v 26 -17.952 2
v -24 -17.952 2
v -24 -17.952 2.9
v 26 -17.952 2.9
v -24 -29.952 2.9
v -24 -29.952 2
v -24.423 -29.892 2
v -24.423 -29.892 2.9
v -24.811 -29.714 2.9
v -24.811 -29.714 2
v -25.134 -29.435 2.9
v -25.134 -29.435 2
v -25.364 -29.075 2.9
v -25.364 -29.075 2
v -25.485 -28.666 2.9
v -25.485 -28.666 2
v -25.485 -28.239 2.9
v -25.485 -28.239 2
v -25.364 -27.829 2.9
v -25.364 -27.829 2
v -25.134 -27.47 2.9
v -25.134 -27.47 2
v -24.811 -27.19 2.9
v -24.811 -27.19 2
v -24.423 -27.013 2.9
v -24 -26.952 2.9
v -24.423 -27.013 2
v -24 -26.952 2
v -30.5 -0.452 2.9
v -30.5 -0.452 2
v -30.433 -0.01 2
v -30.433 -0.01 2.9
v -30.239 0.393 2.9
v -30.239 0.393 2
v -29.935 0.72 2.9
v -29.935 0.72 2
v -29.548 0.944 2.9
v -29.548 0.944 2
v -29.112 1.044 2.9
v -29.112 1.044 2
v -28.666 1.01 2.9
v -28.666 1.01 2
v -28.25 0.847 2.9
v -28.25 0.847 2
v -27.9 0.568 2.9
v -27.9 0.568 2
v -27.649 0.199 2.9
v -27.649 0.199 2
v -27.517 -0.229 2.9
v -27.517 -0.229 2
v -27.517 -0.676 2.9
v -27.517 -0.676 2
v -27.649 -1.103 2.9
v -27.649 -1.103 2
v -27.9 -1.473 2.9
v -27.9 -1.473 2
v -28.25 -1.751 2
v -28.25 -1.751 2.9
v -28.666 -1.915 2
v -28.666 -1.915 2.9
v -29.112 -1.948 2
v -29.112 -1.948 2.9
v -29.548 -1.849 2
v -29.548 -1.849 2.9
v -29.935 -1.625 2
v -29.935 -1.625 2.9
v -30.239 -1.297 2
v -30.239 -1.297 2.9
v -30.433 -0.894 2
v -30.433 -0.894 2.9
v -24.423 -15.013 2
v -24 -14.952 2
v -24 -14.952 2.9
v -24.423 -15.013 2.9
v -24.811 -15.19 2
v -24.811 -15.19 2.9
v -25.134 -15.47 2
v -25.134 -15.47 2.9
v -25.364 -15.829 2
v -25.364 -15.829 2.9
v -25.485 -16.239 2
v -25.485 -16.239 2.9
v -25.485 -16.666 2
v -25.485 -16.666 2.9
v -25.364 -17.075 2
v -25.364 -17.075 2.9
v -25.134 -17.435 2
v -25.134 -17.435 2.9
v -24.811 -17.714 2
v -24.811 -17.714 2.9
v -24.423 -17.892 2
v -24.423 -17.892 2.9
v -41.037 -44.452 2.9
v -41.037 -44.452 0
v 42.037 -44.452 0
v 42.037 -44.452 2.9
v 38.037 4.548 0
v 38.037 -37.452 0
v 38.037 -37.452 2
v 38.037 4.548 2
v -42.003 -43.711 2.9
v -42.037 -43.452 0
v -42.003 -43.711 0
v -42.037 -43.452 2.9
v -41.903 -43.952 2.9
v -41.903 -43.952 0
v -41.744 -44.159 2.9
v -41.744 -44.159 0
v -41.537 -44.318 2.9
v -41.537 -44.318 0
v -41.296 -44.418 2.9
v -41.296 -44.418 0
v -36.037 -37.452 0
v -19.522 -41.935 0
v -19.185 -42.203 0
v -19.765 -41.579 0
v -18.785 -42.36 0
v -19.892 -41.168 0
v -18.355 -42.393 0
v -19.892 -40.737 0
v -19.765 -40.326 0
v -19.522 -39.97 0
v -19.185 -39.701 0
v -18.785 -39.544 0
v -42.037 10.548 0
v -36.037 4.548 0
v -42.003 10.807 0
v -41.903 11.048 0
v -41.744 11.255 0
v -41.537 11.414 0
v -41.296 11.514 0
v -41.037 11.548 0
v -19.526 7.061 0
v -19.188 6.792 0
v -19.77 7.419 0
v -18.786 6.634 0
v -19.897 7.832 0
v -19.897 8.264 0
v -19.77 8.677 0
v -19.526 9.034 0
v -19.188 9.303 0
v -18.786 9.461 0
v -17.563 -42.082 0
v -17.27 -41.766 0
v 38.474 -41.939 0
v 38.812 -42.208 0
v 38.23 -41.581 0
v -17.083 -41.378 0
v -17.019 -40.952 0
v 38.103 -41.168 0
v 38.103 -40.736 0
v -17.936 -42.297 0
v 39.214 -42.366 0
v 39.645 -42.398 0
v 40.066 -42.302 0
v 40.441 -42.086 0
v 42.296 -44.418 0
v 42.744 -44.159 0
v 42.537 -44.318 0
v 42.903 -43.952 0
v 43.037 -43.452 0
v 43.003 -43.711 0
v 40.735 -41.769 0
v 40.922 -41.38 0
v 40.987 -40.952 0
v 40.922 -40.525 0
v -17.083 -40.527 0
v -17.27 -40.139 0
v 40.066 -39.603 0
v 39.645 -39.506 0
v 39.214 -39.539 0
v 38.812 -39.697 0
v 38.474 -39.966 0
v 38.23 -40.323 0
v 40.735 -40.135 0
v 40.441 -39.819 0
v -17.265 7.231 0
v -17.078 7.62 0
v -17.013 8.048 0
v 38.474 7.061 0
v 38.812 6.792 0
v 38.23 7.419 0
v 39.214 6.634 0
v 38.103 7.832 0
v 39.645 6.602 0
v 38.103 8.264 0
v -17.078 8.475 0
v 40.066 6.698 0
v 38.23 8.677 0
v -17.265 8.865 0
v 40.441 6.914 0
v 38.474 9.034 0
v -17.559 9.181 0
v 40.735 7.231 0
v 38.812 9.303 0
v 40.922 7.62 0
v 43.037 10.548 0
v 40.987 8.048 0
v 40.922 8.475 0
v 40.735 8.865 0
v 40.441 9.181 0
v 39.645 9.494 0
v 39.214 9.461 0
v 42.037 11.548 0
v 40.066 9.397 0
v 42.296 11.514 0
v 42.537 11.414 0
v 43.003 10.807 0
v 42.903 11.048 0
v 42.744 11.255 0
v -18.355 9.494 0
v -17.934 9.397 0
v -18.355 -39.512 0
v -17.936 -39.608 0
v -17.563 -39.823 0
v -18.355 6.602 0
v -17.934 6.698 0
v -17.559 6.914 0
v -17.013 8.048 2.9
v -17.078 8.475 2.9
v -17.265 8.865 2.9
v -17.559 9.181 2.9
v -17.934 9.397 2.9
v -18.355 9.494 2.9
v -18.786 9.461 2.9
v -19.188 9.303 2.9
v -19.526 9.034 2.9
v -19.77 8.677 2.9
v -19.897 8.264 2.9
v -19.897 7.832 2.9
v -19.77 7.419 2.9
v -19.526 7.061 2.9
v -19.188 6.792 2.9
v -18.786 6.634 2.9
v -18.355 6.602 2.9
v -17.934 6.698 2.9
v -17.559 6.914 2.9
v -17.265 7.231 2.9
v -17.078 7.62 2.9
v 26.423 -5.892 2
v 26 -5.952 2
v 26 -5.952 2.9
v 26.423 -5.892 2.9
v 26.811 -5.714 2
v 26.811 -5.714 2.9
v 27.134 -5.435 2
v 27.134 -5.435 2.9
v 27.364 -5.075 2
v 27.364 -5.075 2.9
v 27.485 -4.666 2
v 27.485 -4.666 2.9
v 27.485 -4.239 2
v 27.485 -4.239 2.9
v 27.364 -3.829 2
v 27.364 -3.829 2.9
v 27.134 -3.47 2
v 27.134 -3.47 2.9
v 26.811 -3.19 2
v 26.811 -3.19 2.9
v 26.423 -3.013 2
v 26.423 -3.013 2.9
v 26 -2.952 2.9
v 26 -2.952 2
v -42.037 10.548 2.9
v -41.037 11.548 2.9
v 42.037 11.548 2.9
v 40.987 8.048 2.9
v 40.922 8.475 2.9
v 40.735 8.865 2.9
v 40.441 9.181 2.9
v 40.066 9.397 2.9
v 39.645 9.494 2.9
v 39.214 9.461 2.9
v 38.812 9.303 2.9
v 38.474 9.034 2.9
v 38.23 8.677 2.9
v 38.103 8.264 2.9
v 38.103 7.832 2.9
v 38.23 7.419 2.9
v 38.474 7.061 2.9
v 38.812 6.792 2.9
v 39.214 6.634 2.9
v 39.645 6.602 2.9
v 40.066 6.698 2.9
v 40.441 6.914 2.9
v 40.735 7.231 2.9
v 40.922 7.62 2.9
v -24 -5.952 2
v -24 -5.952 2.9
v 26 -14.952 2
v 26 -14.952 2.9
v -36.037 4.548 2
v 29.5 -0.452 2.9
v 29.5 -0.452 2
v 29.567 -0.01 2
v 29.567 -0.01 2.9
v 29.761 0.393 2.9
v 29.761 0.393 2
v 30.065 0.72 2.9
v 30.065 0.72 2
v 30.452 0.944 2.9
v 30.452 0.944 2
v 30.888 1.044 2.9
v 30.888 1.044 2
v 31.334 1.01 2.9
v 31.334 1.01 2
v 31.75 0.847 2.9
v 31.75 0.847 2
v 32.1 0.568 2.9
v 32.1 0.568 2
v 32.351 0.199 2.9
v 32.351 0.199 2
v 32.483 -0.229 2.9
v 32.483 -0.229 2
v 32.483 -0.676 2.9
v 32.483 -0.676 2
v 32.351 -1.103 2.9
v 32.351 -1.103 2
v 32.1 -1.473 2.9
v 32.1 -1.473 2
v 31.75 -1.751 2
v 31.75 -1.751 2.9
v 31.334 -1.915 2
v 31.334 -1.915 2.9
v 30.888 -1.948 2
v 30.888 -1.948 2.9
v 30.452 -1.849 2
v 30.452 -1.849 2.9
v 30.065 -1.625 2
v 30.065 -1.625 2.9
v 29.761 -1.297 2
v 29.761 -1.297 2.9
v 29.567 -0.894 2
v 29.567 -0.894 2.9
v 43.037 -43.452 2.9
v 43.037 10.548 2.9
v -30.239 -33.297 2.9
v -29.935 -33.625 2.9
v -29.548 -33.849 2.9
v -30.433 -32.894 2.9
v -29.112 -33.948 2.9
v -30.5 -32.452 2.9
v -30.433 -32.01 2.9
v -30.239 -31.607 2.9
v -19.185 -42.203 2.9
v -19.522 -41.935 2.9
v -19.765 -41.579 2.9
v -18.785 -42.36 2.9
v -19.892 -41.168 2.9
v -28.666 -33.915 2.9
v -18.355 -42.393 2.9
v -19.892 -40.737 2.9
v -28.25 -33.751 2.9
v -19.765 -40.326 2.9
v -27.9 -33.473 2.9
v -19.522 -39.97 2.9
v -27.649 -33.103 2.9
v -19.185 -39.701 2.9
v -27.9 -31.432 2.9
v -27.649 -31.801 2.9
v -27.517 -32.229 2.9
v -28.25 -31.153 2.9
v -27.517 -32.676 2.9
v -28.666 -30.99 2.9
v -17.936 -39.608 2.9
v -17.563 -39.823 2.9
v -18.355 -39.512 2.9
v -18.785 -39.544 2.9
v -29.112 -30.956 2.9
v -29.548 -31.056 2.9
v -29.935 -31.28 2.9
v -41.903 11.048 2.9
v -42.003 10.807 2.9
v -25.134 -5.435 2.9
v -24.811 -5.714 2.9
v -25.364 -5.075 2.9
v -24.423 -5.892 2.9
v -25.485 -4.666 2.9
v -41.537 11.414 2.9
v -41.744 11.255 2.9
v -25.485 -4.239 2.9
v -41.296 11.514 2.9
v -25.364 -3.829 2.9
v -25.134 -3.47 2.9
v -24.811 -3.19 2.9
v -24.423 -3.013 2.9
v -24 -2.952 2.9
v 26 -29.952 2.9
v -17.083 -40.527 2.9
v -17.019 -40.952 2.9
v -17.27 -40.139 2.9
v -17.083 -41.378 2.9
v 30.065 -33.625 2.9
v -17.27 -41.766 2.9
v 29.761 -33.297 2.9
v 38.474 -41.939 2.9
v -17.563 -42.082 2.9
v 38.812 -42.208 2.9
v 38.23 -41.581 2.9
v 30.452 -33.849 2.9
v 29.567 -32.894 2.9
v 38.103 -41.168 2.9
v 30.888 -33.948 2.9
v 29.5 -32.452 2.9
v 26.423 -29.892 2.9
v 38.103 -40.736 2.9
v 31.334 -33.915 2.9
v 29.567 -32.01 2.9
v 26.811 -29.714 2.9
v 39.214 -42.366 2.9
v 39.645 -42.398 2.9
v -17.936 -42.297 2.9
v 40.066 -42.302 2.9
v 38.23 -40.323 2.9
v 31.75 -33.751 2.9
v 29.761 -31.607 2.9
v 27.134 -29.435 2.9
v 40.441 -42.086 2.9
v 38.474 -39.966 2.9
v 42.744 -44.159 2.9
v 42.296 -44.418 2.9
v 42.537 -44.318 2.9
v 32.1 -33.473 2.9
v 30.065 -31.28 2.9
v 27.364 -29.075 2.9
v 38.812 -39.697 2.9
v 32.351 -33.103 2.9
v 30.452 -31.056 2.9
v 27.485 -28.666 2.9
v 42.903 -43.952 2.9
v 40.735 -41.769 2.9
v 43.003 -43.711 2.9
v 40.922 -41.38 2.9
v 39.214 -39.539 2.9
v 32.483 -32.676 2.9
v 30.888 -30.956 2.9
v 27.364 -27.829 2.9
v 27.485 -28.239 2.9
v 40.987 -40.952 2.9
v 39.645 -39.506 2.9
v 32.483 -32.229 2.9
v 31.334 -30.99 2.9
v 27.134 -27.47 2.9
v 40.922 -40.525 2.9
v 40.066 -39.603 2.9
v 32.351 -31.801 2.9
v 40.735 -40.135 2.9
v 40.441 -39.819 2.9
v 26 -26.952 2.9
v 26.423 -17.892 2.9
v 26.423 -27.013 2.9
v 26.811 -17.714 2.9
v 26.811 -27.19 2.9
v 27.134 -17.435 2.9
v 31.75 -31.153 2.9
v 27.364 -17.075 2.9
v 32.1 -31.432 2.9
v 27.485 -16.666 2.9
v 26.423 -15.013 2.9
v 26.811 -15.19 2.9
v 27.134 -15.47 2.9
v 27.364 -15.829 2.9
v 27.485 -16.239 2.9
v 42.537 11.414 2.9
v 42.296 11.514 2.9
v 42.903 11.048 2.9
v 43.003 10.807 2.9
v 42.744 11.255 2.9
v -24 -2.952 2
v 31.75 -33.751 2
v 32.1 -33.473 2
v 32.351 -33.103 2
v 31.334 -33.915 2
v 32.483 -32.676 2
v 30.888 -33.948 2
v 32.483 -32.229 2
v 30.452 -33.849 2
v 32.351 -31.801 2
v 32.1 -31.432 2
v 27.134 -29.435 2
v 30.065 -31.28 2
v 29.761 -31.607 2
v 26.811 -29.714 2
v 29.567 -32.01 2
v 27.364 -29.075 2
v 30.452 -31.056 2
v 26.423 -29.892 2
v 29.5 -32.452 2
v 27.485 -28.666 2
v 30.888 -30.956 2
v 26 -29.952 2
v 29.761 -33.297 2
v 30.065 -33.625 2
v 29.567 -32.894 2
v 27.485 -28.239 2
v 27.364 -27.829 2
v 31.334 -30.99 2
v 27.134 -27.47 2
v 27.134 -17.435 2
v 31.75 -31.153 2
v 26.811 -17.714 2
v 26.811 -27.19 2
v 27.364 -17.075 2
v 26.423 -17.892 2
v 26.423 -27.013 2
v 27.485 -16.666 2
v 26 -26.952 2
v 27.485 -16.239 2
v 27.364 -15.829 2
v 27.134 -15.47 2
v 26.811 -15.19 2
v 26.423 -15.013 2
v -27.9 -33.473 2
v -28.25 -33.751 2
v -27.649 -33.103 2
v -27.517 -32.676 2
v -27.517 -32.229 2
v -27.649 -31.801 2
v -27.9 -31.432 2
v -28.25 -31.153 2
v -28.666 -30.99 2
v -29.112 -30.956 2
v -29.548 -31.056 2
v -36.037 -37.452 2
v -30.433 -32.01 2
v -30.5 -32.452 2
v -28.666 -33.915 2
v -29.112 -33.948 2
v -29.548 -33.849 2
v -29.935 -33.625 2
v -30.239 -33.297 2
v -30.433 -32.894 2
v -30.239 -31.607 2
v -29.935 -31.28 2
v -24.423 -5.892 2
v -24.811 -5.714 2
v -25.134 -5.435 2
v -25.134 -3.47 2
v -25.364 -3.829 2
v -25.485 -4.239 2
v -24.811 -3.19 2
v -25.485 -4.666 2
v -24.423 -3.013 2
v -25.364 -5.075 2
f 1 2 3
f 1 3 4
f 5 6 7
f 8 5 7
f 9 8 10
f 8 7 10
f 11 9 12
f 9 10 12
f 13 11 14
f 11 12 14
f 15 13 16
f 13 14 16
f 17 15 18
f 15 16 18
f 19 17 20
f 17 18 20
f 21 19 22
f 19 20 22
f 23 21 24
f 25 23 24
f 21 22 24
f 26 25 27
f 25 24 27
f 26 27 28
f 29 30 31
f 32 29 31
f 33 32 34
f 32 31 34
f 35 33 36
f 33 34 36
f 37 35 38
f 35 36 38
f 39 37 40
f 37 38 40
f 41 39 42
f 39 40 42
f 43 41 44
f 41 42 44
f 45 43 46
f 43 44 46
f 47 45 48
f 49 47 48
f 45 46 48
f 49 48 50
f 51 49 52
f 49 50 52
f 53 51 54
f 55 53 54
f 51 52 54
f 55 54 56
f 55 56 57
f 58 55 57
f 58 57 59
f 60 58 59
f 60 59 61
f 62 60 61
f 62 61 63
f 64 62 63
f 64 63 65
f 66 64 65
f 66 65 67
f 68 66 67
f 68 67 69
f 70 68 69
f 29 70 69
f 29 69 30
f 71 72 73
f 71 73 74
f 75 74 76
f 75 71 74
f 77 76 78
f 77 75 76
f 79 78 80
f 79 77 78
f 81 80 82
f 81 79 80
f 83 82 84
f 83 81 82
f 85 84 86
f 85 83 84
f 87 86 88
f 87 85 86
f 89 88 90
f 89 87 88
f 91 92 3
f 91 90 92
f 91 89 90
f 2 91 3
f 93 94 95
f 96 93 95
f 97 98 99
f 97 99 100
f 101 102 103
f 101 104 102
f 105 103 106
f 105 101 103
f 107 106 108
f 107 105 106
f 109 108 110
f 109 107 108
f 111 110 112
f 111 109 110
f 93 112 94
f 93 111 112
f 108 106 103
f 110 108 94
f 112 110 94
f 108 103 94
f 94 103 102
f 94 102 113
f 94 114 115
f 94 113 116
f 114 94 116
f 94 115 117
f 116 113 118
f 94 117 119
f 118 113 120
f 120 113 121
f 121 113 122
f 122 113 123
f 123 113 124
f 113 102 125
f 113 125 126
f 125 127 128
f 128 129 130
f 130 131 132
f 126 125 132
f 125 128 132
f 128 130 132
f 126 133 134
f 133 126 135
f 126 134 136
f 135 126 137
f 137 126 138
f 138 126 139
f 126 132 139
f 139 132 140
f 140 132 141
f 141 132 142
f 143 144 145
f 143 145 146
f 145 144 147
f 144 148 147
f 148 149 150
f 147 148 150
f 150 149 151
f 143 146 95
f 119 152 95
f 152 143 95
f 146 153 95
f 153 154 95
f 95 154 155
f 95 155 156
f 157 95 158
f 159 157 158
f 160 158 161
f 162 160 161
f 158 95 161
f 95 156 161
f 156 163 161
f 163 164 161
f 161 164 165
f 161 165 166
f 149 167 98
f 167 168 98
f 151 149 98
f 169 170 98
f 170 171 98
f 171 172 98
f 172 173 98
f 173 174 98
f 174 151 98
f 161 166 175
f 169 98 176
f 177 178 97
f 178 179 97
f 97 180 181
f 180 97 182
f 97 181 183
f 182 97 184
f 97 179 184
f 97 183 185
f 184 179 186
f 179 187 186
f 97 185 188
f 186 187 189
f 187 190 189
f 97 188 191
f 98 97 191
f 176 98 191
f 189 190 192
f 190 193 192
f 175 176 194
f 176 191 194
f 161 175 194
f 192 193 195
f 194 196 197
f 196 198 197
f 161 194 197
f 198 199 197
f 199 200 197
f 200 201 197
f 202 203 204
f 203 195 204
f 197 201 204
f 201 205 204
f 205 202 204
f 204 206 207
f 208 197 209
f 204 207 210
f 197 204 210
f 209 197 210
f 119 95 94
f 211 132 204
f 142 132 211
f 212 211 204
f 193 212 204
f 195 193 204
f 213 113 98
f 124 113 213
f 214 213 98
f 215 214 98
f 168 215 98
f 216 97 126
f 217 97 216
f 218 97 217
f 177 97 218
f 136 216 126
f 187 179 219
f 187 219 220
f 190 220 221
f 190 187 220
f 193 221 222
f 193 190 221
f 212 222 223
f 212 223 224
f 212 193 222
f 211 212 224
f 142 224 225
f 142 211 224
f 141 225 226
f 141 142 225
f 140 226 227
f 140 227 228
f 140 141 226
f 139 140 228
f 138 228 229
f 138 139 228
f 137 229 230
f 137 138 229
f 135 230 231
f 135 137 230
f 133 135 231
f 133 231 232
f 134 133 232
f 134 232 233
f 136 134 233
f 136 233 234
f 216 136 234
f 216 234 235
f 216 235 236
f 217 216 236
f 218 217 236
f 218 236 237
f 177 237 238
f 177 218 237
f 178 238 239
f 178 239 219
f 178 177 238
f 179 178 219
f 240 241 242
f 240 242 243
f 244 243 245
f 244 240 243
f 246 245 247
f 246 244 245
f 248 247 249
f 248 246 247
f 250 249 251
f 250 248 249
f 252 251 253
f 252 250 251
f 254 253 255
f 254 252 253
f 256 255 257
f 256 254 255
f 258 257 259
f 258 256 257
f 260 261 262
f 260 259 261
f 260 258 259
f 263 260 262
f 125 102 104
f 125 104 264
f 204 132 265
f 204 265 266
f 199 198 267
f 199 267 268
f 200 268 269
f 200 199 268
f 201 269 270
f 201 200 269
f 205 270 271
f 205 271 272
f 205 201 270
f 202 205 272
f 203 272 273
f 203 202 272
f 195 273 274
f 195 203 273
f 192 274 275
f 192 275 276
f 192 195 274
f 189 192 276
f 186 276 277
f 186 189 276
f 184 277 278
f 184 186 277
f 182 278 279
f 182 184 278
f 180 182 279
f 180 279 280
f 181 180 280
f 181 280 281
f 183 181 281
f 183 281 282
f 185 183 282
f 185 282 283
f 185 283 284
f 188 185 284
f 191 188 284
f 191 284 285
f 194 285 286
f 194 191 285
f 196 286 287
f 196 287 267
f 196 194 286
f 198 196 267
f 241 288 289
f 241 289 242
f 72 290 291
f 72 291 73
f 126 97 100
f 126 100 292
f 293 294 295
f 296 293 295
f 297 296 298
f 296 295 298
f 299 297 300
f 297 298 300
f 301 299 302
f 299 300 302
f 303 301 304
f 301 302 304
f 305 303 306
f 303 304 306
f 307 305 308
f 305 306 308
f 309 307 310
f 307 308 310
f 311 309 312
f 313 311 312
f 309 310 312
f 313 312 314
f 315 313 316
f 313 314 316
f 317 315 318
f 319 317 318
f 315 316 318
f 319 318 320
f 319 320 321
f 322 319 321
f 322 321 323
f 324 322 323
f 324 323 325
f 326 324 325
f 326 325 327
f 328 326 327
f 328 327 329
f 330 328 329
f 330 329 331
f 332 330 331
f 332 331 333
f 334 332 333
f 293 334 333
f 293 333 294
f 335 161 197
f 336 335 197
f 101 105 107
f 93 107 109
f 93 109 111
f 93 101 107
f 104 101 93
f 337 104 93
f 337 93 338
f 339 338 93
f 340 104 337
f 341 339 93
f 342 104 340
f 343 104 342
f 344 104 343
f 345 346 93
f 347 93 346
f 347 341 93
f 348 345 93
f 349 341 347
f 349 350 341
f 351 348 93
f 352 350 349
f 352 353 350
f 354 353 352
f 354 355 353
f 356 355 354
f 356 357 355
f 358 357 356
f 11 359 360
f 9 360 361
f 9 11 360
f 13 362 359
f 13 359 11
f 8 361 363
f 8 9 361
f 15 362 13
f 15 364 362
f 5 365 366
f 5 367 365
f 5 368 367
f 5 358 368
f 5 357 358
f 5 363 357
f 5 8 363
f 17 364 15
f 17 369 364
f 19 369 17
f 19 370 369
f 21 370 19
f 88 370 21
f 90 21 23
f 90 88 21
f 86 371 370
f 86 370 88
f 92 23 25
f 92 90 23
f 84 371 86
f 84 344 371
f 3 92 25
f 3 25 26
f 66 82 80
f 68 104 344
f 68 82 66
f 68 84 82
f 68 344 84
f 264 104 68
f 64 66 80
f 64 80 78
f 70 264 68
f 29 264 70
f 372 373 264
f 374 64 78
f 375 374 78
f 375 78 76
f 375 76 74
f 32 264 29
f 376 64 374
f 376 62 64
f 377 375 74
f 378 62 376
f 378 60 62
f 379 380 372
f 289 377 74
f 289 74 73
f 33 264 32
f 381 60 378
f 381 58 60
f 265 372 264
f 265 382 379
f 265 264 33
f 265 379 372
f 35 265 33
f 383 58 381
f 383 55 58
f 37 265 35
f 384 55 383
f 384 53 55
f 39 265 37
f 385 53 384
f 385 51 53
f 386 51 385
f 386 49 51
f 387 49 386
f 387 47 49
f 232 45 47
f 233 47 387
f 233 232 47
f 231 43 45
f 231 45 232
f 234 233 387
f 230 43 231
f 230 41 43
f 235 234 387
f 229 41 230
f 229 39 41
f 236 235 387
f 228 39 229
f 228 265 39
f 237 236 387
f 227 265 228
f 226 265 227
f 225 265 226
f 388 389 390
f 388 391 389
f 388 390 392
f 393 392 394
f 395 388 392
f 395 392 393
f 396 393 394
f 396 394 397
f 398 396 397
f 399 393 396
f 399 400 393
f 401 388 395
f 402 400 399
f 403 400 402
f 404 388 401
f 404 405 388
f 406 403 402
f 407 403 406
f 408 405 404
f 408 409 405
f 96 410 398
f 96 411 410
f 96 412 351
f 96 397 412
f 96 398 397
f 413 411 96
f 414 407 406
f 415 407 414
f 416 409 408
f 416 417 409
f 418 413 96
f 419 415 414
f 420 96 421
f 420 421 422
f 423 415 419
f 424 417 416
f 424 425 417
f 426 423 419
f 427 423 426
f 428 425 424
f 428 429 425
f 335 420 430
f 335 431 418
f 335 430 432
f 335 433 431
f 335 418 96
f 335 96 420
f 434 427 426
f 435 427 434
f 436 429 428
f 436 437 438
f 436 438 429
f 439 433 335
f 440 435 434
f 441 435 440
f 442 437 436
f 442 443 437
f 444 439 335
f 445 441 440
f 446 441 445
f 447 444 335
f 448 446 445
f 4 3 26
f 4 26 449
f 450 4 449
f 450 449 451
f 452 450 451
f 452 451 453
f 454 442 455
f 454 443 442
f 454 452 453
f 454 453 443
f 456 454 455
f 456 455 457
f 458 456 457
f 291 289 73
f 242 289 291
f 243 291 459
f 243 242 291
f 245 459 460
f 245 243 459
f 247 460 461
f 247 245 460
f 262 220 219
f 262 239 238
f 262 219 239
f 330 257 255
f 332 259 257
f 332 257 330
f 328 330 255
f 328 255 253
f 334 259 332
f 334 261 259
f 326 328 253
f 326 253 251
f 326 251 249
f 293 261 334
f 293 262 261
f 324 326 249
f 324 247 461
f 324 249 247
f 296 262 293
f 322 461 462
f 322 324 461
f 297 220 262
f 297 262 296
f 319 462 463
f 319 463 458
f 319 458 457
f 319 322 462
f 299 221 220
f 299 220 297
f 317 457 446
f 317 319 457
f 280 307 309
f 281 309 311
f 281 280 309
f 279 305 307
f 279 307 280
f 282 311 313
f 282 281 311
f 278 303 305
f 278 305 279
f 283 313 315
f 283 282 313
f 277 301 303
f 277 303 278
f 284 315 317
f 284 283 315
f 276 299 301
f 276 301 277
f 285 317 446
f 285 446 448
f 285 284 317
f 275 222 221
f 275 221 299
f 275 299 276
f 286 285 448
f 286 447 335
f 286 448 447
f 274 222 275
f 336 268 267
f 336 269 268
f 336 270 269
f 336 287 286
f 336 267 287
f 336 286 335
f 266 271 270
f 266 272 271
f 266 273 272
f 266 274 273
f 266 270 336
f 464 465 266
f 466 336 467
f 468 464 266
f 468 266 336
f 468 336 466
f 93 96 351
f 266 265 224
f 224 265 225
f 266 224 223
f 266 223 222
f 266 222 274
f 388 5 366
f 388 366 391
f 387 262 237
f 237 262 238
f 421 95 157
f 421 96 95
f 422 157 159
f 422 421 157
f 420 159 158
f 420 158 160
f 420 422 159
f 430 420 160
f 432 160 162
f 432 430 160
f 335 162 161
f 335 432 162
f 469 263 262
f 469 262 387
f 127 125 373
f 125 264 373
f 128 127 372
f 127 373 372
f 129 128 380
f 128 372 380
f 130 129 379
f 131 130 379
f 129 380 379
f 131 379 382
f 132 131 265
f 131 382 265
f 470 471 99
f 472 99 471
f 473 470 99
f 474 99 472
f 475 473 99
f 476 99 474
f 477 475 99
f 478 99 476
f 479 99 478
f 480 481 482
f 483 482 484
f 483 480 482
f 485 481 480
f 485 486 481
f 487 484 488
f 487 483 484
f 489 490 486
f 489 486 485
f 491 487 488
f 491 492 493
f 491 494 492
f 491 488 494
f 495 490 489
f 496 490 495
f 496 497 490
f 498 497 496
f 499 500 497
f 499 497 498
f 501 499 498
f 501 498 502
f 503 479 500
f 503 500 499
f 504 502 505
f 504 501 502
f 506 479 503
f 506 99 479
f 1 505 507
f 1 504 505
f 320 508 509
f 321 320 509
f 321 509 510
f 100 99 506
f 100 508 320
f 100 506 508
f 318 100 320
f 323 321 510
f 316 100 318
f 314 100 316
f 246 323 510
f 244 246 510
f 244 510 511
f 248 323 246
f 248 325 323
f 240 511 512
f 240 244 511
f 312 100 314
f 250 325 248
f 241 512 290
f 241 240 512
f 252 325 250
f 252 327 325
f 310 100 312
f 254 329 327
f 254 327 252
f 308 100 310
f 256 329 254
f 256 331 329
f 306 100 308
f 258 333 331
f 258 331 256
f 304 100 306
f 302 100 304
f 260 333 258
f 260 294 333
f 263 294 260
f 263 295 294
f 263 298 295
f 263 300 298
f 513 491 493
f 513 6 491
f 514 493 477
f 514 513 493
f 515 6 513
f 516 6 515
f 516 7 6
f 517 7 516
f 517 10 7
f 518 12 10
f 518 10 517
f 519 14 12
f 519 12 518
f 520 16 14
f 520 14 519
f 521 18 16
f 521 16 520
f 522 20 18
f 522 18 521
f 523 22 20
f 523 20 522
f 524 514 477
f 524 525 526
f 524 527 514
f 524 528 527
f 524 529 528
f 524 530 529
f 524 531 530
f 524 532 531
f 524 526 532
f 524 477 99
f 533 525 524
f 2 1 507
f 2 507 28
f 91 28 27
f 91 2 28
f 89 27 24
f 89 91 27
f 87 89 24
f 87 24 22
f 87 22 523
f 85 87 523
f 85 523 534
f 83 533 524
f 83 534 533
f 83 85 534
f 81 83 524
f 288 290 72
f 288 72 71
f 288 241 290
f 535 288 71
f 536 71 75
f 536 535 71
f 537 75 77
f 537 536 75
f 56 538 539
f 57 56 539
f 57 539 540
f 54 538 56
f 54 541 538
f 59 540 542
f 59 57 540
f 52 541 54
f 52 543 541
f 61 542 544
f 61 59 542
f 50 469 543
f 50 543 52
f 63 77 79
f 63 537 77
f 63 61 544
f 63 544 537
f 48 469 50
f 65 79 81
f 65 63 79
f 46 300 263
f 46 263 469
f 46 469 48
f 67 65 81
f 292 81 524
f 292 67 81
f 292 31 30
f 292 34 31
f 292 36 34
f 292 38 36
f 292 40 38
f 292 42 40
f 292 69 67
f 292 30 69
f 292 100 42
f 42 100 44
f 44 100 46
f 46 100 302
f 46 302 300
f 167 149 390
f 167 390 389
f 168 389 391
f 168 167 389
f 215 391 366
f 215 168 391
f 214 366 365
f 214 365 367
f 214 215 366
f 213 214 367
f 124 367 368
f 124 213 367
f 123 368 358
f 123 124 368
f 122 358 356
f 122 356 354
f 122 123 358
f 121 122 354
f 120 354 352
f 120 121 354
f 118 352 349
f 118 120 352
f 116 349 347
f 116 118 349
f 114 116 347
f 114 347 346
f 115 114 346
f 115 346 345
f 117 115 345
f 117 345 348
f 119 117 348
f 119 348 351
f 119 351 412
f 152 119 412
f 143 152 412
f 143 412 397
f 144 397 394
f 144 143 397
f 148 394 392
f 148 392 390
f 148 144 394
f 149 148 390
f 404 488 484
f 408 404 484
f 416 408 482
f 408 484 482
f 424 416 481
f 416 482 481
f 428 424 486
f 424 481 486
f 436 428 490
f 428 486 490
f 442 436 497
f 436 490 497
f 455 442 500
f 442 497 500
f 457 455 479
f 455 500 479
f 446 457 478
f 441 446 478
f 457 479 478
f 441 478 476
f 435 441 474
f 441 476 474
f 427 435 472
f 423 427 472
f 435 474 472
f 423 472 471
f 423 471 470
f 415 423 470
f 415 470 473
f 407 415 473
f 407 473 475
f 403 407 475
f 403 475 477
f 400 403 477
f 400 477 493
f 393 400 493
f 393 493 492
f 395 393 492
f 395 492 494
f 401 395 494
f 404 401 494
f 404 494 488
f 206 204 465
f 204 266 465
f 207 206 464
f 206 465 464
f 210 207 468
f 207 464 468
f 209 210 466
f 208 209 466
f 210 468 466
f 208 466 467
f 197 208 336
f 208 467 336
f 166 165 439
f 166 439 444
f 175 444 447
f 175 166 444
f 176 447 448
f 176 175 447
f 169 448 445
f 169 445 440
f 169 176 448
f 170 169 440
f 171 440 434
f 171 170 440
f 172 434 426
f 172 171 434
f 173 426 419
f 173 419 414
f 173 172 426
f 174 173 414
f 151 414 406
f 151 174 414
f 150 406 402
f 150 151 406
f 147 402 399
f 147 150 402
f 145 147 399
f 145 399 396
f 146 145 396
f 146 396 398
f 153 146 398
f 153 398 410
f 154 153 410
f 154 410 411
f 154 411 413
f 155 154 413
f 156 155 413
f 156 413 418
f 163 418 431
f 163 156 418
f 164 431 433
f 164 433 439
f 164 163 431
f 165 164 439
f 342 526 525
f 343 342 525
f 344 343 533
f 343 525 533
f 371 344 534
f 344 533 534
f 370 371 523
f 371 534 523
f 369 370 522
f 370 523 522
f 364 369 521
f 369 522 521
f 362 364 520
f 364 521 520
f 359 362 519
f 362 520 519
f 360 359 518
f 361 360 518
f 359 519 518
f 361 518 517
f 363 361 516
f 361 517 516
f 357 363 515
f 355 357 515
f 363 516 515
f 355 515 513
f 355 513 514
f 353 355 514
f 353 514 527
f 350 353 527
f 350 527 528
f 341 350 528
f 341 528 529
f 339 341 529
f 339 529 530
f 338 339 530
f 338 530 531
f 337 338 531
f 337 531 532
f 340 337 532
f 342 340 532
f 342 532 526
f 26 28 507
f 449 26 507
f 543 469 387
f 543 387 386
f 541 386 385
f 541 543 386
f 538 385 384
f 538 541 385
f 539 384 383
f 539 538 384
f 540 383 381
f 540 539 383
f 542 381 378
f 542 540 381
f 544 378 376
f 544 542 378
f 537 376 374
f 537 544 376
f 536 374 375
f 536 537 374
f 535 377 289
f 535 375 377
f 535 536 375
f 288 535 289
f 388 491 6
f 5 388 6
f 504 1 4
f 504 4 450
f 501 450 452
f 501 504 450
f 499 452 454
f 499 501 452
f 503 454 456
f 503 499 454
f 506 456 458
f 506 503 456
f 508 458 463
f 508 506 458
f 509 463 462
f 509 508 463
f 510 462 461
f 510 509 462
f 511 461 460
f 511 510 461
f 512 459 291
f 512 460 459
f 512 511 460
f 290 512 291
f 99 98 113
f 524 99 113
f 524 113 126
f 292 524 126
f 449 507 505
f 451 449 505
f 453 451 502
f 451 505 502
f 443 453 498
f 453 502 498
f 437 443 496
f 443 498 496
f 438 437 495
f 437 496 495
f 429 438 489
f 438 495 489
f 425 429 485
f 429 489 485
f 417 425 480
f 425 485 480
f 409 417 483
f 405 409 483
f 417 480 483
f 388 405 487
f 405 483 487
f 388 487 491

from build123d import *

# Parameters (mm, degrees)
SKETCH1_W           = 85.073492716
SKETCH1_H           = 56
SKETCH1_R           = 1.45
SKETCH1_R_2         = 1.444439883
BOSS_EXTRUDE2_DEPTH = 2.9
FILLET1_R           = 1
SKETCH2_W           = 74.073492716
SKETCH2_H           = 42
CUT_EXTRUDE1_DEPTH  = 2
SKETCH3_R           = 1.5
CUT_EXTRUDE2_DEPTH  = 13


with BuildPart() as part:
    # Sketch1 → Boss-Extrude2 (new body)
    with BuildSketch(Plane.XY):
        with Locations((0.5, -16.452272815)):
            Rectangle(SKETCH1_W, SKETCH1_H)
        with Locations((39.536746358, 8.047727185)):
            Circle(SKETCH1_R, mode=Mode.SUBTRACT)
        with Locations((39.536746358, -40.952272815)):
            Circle(SKETCH1_R, mode=Mode.SUBTRACT)
        with Locations((-18.463253642, 8.047727185)):
            Circle(SKETCH1_R, mode=Mode.SUBTRACT)
        with Locations((-18.463253642, -40.952272815)):
            Circle(SKETCH1_R_2, mode=Mode.SUBTRACT)
    extrude(amount=BOSS_EXTRUDE2_DEPTH)

    # Fillet1
    fillet1_edges = [part.edges().sort_by_distance(p)[0] for p in [
        (-42.036746358, 11.547727185, 1.45),
        (43.036746358, 11.547727185, 1.45),
        (43.036746358, -44.452272815, 1.45),
        (-42.036746358, -44.452272815, 1.45),
    ]]
    fillet(fillet1_edges, radius=FILLET1_R)

    # Sketch2 → Cut-Extrude1 (cut)
    with BuildSketch(Plane(origin=(0, 0, 0), x_dir=(-1, 0, 0), z_dir=(0, 0, -1))):
        with Locations((-1, -16.452272815)):
            Rectangle(SKETCH2_W, SKETCH2_H)
    extrude(amount=-CUT_EXTRUDE1_DEPTH, mode=Mode.SUBTRACT)

    # Sketch3 → Cut-Extrude2 (cut)
    with BuildSketch(Plane(origin=(0, 0, 2), x_dir=(-1, 0, 0), z_dir=(0, 0, -1))):
        with Locations((-31, -0.452272815)):
            Circle(SKETCH3_R)
        with Locations((-31, -32.452272815)):
            Circle(SKETCH3_R)
        with Locations((29, -32.452272815)):
            Circle(SKETCH3_R)
        with Locations((29, -0.452272815)):
            Circle(SKETCH3_R)
        with BuildLine():
            Line((-26, -2.952272815), (24, -2.952272815))
            ThreePointArc((24, -2.952272815), (25.5, -4.452272815), (24, -5.952272815))
            Line((24, -5.952272815), (-26, -5.952272815))
            ThreePointArc((-26, -5.952272815), (-27.5, -4.452272815), (-26, -2.952272815))
        make_face()
        with BuildLine():
            Line((-26, -29.952272815), (24, -29.952272815))
            ThreePointArc((24, -29.952272815), (25.5, -28.452272815), (24, -26.952272815))
            Line((24, -26.952272815), (-26, -26.952272815))
            ThreePointArc((-26, -26.952272815), (-27.5, -28.452272815), (-26, -29.952272815))
        make_face()
        with BuildLine():
            Line((-26, -14.952272815), (24, -14.952272815))
            ThreePointArc((24, -14.952272815), (25.5, -16.452272815), (24, -17.952272815))
            Line((24, -17.952272815), (-26, -17.952272815))
            ThreePointArc((-26, -17.952272815), (-27.5, -16.452272815), (-26, -14.952272815))
        make_face()
    extrude(amount=-CUT_EXTRUDE2_DEPTH, mode=Mode.SUBTRACT)


solid = part.part
